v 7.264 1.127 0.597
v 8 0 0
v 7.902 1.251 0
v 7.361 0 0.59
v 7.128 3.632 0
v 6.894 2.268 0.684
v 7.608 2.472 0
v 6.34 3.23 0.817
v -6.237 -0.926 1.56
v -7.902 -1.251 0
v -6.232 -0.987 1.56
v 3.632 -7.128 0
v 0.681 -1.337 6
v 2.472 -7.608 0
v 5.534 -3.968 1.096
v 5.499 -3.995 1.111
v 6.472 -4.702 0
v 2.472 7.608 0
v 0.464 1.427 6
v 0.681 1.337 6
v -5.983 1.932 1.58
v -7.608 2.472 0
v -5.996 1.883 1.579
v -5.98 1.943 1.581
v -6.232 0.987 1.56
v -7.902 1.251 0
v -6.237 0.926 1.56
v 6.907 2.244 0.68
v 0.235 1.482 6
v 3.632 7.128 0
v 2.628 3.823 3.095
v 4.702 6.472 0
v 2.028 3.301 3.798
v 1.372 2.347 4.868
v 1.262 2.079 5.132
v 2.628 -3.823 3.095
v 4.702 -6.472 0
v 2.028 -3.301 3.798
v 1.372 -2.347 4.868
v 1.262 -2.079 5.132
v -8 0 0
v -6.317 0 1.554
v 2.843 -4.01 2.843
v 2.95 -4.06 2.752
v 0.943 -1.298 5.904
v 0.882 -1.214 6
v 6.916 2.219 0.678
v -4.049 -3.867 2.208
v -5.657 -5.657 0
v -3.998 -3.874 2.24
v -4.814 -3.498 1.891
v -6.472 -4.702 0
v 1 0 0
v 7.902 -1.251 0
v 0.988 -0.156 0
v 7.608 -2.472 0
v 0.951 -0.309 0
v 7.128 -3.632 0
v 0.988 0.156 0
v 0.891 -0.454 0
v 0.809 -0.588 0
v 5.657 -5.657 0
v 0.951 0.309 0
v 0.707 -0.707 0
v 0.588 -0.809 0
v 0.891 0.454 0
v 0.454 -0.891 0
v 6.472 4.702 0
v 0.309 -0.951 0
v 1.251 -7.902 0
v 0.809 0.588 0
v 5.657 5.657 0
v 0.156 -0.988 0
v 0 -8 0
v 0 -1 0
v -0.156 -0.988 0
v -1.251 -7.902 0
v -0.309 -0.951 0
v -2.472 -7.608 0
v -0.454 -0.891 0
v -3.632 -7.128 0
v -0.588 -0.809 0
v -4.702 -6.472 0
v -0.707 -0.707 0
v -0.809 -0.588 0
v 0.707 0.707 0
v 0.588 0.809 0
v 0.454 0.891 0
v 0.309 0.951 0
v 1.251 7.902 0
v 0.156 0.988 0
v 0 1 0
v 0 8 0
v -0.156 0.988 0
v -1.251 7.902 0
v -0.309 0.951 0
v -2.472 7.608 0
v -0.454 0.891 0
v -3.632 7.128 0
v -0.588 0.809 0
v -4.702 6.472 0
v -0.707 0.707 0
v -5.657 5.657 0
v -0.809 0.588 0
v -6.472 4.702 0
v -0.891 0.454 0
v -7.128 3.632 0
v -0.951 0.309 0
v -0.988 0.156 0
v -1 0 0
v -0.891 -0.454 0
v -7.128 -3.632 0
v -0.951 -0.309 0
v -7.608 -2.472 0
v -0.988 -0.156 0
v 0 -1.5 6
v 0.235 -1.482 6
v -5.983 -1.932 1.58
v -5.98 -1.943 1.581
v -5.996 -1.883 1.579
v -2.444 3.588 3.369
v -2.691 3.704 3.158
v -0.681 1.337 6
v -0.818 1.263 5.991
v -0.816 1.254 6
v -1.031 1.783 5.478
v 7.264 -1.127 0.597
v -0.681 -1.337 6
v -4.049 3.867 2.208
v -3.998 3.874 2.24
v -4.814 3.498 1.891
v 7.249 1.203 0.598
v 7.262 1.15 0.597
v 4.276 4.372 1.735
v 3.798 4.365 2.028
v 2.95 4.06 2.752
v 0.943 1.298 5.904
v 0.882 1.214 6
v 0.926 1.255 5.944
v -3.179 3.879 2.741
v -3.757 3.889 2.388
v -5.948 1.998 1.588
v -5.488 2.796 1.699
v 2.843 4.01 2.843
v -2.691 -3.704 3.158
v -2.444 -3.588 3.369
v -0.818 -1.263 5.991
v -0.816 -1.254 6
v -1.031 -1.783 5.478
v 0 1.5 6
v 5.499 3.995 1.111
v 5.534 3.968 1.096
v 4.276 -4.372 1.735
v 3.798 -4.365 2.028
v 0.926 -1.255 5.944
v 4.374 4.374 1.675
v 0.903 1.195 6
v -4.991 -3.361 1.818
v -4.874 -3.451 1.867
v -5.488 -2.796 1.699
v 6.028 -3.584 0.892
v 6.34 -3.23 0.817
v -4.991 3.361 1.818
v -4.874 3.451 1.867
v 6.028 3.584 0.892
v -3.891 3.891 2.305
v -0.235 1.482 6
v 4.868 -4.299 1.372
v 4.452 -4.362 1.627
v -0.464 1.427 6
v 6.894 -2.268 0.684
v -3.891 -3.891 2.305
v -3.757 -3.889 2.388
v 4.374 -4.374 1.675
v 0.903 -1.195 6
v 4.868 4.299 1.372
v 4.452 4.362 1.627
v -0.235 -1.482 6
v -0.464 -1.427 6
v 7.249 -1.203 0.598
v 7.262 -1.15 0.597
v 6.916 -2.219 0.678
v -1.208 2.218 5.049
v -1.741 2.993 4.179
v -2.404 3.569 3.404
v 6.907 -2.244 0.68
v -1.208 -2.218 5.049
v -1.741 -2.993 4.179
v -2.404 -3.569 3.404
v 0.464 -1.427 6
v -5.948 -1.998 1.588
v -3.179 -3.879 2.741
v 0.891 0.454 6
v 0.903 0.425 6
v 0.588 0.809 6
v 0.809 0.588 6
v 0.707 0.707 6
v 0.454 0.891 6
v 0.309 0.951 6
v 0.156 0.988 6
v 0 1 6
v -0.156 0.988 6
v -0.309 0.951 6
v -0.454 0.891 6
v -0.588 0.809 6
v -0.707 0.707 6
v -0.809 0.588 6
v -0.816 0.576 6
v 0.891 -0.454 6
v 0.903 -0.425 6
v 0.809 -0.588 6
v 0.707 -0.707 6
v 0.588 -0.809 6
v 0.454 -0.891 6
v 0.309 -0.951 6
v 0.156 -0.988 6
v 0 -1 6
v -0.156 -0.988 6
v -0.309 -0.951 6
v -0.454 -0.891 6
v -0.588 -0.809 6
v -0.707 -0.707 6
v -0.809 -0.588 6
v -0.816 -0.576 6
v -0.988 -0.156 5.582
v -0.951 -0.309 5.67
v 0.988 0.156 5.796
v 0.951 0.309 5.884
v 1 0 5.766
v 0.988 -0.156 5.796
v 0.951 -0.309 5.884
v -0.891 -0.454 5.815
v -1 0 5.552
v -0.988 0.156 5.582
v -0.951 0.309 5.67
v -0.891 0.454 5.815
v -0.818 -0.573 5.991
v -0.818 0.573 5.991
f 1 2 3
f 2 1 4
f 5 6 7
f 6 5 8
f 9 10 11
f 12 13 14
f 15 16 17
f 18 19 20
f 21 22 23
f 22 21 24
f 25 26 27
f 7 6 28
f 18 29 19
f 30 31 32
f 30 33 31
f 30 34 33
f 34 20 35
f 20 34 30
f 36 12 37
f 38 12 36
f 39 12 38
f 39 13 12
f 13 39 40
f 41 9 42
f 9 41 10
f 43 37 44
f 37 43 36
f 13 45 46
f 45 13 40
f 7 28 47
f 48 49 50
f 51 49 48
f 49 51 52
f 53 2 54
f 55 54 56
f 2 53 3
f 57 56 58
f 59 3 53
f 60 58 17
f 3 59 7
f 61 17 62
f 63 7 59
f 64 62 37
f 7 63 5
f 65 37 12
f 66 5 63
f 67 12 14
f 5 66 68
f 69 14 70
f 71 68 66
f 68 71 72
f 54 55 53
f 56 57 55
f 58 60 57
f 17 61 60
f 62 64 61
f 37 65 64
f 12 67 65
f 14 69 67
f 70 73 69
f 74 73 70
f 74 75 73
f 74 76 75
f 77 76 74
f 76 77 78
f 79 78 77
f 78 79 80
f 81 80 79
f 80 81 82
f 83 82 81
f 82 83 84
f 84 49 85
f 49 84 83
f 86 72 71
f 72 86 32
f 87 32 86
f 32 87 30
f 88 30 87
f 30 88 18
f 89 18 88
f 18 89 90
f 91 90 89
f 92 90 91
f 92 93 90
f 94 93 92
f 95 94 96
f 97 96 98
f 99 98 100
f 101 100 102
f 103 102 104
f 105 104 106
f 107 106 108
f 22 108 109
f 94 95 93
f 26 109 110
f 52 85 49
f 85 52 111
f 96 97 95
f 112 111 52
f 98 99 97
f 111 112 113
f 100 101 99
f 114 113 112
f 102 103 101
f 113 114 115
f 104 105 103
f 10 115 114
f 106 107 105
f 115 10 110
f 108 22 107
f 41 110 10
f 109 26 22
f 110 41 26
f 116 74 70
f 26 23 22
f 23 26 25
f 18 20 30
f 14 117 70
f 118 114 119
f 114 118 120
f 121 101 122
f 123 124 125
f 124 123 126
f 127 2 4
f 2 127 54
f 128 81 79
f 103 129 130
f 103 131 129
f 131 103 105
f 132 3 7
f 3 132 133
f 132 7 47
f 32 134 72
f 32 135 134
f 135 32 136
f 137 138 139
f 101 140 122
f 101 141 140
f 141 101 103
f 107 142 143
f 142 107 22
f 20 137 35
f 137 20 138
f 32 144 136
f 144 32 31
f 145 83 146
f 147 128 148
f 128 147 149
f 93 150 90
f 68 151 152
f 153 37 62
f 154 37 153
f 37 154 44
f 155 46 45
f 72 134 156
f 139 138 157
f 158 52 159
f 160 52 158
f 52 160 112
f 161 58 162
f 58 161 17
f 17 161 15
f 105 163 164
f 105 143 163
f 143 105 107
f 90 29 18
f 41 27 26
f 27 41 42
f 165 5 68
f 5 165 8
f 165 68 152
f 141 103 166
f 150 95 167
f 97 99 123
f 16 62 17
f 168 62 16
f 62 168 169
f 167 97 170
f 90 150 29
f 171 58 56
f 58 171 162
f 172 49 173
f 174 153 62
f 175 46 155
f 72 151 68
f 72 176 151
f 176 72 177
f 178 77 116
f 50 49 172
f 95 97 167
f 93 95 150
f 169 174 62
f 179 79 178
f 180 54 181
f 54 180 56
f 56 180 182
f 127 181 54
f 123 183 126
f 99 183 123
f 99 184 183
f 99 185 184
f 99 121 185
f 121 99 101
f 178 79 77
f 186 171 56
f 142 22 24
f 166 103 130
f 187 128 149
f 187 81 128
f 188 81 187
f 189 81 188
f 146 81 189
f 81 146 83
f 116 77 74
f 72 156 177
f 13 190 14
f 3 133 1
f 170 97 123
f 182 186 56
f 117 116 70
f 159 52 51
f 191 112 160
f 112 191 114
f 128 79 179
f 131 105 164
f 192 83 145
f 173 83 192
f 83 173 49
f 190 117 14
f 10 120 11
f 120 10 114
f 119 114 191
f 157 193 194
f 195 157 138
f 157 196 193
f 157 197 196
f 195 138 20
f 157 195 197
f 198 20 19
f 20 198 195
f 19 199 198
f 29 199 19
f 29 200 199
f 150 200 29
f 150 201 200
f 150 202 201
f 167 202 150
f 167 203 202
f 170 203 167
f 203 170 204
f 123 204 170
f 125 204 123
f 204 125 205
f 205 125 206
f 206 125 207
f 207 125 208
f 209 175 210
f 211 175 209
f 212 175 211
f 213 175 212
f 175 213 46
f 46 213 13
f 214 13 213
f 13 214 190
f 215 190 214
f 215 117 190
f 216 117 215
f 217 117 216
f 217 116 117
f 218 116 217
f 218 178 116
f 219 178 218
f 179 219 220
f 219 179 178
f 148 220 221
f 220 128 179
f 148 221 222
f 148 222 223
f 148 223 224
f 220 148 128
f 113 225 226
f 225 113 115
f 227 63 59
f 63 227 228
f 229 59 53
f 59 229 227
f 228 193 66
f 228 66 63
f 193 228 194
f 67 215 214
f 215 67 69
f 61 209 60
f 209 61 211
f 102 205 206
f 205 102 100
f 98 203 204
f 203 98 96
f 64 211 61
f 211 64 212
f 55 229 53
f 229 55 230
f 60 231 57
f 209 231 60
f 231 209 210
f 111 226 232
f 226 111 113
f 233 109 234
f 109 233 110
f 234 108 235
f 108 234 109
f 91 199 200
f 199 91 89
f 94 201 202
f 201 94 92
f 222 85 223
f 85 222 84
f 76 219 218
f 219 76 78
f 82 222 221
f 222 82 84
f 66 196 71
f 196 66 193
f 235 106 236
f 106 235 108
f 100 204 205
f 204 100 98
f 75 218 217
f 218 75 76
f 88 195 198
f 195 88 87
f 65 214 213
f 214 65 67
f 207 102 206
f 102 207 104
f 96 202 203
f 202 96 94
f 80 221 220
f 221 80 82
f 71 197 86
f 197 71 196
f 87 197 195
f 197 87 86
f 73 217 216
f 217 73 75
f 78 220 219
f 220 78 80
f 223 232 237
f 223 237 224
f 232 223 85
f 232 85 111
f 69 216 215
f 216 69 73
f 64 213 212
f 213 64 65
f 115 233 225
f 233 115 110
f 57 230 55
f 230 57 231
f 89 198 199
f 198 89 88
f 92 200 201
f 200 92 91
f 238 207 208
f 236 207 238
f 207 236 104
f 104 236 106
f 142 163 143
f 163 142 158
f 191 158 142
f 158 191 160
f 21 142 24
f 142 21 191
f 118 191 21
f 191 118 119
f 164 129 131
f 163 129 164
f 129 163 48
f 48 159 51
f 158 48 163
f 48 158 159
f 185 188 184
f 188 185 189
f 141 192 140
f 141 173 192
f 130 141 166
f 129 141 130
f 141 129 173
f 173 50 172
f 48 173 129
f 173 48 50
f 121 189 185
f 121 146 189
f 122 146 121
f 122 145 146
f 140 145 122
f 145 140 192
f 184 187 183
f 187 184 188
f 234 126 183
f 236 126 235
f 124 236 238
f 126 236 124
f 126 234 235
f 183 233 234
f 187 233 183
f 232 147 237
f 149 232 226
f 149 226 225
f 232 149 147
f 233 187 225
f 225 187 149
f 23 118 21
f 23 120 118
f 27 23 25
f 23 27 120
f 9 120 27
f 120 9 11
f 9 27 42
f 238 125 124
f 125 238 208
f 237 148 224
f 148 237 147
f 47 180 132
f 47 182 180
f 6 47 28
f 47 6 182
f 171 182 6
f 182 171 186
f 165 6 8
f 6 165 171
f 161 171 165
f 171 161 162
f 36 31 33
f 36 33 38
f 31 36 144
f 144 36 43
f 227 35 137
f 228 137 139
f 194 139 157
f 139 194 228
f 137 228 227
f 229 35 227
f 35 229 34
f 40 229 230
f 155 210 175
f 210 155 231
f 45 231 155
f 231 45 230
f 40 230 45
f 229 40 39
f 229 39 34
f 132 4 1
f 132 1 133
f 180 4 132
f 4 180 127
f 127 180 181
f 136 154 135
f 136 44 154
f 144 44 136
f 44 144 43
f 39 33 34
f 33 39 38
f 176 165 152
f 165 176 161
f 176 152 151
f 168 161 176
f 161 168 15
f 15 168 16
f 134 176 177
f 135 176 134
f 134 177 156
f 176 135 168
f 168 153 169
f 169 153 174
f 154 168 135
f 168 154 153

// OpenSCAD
// [FL_INDEX: keywords="openscad, 3d_parametric, Improved_version_of_filament_bend_preventer, csg_solid" | COT="Parametric OpenSCAD design from 3DCodeverse"]
// Title: Improved version of filament bend preventer

//bottom radius
r1=8;
//top radius
r2=1.5;
//hole radius
r3=1;
//height
h=6;
//left cylinder cutout
r4=6.5;
//right cylinder cutout
r5=8;
//clearance between bolt and top of hotend
clear1=1.5;
//clearance between bearing and top of hotend
clear2=0.5;

difference(){
	cylinder(r1=r1,r2=r2,h=h,$fn=40);
	translate([0,0,-0.05])
		cylinder(r=r3,h=h+0.1,$fn=40);
	translate([-r4-r3/2,25,clear1+r4])
		rotate([90,0,0])
			cylinder(r=r4,h=50,$fn=40);
	translate([r5+r3/2,25,clear2+r5])
		rotate([90,0,0])
			cylinder(r=r5,h=50,$fn=40);
}
